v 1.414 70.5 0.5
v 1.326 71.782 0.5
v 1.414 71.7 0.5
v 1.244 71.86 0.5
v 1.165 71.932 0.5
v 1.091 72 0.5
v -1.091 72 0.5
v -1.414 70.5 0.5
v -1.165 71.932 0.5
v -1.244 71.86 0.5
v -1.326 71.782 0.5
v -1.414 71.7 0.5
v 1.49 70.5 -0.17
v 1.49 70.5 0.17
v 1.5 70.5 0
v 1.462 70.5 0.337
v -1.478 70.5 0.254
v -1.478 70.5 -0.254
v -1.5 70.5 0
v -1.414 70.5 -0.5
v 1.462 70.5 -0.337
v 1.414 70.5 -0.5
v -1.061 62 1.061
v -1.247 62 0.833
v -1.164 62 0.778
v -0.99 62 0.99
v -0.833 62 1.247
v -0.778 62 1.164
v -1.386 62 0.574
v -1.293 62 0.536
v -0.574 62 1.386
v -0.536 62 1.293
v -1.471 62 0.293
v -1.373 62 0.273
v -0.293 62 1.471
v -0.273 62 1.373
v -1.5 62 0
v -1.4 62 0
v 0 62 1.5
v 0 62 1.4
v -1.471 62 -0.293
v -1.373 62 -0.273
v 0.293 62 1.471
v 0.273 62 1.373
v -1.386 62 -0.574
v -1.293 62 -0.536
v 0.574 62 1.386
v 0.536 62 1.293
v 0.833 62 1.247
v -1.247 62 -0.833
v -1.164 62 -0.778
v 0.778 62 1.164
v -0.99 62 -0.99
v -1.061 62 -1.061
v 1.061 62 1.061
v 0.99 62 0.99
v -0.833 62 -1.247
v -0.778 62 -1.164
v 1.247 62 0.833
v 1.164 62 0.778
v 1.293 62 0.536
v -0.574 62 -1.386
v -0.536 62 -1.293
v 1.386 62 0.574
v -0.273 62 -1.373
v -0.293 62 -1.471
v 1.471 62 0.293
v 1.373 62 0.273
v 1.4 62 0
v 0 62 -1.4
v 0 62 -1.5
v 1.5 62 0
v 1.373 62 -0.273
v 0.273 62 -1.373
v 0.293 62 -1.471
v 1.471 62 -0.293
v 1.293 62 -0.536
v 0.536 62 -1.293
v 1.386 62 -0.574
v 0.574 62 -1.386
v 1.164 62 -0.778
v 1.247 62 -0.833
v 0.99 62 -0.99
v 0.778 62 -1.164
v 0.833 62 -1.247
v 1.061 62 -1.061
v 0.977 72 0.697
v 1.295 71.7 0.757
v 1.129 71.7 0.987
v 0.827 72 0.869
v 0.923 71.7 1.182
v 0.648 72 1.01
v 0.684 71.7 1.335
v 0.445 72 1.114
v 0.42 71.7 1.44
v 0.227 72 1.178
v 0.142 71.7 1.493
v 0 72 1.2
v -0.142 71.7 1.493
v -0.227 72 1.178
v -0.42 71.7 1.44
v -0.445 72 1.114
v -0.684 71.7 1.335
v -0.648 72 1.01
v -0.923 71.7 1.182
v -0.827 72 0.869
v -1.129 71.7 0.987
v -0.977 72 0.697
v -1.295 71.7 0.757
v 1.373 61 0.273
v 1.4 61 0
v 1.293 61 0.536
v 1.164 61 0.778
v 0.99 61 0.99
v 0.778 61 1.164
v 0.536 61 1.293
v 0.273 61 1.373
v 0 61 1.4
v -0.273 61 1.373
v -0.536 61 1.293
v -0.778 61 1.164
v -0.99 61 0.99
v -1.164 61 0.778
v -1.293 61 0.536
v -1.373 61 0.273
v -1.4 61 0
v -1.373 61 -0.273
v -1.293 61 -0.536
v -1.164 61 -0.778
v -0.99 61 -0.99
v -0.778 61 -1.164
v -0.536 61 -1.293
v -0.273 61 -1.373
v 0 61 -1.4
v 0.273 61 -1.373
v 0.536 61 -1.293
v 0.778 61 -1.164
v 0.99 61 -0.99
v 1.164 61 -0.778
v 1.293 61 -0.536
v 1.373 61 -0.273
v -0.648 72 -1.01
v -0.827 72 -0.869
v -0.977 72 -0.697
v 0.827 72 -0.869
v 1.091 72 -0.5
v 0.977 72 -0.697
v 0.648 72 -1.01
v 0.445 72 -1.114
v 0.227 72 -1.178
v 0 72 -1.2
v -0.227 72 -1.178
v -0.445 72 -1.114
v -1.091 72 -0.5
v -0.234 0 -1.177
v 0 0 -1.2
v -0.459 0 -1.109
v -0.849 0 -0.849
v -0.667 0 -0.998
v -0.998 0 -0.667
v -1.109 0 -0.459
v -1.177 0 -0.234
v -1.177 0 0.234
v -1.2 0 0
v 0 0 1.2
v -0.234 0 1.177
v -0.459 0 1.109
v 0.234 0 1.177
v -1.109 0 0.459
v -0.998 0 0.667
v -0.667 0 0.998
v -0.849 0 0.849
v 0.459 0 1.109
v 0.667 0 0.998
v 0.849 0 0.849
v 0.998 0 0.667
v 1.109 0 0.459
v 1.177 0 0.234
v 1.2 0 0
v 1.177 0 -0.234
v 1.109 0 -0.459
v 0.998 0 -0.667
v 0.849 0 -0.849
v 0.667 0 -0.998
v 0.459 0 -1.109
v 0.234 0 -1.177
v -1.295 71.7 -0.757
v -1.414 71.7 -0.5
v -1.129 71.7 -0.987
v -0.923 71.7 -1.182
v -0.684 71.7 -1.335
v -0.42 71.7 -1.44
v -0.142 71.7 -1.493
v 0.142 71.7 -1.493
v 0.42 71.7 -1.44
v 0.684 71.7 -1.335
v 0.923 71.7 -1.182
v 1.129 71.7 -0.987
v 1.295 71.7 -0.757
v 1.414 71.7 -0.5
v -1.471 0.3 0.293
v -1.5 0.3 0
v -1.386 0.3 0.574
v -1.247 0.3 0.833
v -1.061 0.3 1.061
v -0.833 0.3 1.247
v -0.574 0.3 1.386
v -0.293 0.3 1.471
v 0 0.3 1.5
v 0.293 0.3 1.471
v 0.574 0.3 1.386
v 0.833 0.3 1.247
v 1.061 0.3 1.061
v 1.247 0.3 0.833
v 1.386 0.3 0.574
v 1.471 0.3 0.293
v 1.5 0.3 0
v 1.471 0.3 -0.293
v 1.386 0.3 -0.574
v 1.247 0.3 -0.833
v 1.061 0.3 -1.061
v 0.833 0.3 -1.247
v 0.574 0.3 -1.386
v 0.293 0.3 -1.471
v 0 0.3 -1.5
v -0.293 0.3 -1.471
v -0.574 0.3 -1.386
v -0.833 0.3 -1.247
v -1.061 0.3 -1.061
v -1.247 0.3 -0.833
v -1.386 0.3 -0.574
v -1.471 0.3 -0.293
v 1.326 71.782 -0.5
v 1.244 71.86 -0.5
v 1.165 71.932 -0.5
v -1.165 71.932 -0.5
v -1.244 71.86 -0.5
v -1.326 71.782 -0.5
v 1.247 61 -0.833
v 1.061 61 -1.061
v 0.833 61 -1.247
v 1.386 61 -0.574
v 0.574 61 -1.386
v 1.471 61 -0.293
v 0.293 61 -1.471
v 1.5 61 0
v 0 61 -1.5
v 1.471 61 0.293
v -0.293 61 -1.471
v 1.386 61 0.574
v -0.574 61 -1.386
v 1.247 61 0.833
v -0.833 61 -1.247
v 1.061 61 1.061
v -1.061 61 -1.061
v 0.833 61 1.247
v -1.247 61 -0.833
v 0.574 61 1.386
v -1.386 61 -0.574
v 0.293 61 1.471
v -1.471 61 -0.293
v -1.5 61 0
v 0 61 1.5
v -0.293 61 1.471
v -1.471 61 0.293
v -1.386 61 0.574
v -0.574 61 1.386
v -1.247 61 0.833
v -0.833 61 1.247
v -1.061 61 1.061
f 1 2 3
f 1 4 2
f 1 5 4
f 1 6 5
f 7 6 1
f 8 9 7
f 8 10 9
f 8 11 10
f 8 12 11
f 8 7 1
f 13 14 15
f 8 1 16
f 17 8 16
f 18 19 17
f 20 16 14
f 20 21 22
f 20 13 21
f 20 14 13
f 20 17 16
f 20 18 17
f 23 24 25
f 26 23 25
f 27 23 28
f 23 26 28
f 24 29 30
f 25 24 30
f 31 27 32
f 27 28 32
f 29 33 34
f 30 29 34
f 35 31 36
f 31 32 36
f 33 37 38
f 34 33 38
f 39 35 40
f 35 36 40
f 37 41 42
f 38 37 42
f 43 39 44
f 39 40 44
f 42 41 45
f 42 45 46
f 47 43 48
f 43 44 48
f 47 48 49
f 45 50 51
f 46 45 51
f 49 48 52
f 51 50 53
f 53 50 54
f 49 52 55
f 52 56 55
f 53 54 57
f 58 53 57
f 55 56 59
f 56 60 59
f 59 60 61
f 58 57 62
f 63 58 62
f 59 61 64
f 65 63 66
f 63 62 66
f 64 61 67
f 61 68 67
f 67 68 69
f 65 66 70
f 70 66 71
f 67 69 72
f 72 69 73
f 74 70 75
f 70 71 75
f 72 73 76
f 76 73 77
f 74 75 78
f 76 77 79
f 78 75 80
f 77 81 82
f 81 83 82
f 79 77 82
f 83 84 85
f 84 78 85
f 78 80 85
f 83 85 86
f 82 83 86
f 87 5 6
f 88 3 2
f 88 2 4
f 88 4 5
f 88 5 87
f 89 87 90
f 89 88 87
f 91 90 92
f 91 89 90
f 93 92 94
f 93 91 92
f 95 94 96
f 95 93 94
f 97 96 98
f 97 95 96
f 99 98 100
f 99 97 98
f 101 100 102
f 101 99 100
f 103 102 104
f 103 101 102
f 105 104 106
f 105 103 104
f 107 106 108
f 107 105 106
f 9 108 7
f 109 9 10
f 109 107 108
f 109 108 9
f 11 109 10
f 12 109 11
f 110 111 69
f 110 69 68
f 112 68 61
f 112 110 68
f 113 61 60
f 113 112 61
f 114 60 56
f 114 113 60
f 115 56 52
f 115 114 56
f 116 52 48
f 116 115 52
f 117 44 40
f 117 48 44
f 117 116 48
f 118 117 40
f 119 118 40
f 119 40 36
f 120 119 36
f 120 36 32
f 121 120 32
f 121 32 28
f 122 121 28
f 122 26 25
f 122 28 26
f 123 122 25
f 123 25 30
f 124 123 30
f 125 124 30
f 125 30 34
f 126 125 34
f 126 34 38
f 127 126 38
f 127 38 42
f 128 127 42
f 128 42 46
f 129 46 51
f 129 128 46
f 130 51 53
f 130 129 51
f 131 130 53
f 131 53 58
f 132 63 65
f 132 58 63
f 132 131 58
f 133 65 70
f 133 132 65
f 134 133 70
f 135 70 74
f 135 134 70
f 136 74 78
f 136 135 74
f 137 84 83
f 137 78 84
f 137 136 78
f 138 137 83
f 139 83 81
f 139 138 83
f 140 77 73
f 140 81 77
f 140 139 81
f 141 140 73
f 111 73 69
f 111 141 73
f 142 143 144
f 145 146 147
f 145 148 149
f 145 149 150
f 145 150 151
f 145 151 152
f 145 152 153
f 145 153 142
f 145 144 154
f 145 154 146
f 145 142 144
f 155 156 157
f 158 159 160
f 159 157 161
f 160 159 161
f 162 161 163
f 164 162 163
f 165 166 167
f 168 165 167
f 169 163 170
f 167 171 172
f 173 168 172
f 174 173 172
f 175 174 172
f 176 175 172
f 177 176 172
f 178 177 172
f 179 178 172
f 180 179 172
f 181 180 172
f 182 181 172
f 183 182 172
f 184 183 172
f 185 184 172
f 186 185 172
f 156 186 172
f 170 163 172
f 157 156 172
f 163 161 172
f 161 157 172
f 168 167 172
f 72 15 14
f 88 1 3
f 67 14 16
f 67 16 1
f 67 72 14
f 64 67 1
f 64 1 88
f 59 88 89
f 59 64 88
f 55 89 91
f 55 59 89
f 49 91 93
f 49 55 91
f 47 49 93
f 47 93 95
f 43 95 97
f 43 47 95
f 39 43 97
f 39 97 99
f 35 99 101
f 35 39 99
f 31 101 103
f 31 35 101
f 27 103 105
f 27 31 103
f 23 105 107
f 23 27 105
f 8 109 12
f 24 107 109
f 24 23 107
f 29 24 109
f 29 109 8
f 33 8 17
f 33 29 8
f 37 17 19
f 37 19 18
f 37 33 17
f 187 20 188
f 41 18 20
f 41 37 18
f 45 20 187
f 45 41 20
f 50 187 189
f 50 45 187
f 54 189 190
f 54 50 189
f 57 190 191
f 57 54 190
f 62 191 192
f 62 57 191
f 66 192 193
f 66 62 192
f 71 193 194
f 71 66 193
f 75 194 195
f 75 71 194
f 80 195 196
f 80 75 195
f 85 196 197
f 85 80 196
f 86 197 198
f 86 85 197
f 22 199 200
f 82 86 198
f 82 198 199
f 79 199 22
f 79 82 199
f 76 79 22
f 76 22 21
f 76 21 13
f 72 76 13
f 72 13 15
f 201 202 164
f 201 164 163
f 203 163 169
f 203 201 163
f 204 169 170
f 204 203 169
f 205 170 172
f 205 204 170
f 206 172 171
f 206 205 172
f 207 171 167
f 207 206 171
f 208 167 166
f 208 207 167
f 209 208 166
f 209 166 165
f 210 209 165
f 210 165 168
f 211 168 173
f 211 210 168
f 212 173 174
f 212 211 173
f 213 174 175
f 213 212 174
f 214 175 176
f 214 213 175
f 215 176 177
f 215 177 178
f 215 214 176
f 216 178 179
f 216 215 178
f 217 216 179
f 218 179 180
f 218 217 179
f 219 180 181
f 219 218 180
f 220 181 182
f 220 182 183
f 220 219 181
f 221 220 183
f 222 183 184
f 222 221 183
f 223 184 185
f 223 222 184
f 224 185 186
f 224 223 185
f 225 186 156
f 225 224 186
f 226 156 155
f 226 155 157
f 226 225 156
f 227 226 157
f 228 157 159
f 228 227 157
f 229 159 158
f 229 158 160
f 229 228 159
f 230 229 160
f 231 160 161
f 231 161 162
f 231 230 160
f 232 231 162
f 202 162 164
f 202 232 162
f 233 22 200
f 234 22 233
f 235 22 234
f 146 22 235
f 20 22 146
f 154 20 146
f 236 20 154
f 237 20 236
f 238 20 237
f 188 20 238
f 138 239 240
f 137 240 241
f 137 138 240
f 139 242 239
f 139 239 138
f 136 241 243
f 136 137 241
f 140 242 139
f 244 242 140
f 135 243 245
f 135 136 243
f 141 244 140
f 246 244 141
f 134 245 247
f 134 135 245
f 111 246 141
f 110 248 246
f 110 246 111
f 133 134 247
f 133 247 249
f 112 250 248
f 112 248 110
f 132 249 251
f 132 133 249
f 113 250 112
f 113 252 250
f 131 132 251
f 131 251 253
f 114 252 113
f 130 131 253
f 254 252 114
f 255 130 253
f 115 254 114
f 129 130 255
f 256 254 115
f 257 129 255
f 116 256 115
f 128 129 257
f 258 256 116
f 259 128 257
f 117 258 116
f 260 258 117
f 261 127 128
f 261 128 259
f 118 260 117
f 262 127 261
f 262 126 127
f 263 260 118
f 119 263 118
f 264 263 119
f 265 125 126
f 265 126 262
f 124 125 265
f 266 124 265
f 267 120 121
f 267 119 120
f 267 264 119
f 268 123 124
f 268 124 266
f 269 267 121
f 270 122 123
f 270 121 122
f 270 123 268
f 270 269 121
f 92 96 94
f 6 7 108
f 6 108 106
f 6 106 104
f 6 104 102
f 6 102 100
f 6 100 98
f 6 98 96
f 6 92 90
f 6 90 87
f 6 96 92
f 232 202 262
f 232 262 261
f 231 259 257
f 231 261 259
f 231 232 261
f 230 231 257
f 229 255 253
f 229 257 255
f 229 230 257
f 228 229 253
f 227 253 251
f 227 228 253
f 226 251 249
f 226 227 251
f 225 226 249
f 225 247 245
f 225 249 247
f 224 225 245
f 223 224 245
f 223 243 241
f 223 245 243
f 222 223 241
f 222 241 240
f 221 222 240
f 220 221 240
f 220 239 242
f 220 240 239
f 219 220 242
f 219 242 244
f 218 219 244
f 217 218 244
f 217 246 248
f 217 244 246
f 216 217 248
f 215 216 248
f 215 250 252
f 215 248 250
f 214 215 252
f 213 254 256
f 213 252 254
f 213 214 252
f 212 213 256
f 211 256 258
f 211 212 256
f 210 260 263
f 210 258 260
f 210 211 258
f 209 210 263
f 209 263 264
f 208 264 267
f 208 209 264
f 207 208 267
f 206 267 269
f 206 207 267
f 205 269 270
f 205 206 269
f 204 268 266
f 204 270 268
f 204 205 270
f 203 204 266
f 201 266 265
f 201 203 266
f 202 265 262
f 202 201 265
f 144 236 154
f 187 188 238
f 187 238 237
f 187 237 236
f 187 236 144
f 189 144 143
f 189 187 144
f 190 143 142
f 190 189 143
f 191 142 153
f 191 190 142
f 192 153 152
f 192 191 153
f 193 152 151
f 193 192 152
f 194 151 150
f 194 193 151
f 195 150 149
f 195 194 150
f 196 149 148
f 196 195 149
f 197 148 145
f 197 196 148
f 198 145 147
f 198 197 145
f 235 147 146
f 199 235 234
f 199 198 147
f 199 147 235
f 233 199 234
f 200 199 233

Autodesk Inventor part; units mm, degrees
ref_plane "YZ Plane" through (0, 0, 0) normal (1, 0, 0) x (0, 1, 0)
ref_plane "XZ Plane" through (0, 0, 0) normal (0, 1, 0) x (-1, 0, 0)
ref_plane "XY Plane" through (0, 0, 0) normal (0, 0, 1) x (1, 0, 0)
sketch "Sketch1" plane through (0, 0, 0) normal (0, 1, 0) x (-1, 0, 0)
  circle A0 centre (0, 0) radius 1.5
  dimension "d0" = 3
extrude "Extrusion1" add sketch "Sketch1" along normal blind 61
sketch "Sketch2" plane through (0, 61, 0) normal (0, 1, 0) x (1, 0, 0)
  circle A0 centre (0, 0) radius 1.4
  dimension "d3" = 2.8
extrude "Extrusion2" add sketch "Sketch2" along normal blind 1
sketch "Sketch3" plane through (0, 62, 0) normal (0, 1, 0) x (1, 0, 0)
  circle A0 centre (0, 0) radius 1.5
  dimension "d6" = 3
extrude "Extrusion3" add sketch "Sketch3" along normal blind 10
thread "Thread1" size "M3x0.5" class "6g" standard "ANSI Metric M Profile" full length
chamfer "Chamfer1" distance 0.3 angle 45 1 edges at (-1.5, 72, 0)
chamfer "Chamfer2" distance 0.3 angle 45 1 edges at (1.5, 0, 0)
sketch "Sketch4" plane through (0, 0, 0) normal (1, 0, 0) x (0, 1, 0)
  line L0 (62, -1.5) -> (62, 1.5) projected
  line L1 (71.7, -1.5) -> (71.7, 1.5) projected
  line L2 (71.7, -1.5) -> (71.7, 1.5) projected
  line L3 (72, 1.2) -> (72, -1.2) projected
  line L4 (73.5, 0.5) -> (70.5, 0.5)
  line L5 (70.5, 0.5) -> (70.5, -0.5)
  line L6 (70.5, -0.5) -> (73.5, -0.5)
  line L7 (73.5, -0.5) -> (73.5, 0.5)
  line L8 (72, 1.2) -> (72, -1.2) projected
  line L9 (73.5, 0.5) -> (70.5, -0.5) construction
  line L10 (70.5, 0.5) -> (73.5, -0.5) construction
  point P0 (0, 0)
  point P1 (72, 0)
  dimension "d17" = 3
  dimension "d18" = 1
extrude "Extrusion4" cut sketch "Sketch4" along normal mid plane 10
properties part number "wał_prowadzący_hamulca" material "Aluminum 6061"
